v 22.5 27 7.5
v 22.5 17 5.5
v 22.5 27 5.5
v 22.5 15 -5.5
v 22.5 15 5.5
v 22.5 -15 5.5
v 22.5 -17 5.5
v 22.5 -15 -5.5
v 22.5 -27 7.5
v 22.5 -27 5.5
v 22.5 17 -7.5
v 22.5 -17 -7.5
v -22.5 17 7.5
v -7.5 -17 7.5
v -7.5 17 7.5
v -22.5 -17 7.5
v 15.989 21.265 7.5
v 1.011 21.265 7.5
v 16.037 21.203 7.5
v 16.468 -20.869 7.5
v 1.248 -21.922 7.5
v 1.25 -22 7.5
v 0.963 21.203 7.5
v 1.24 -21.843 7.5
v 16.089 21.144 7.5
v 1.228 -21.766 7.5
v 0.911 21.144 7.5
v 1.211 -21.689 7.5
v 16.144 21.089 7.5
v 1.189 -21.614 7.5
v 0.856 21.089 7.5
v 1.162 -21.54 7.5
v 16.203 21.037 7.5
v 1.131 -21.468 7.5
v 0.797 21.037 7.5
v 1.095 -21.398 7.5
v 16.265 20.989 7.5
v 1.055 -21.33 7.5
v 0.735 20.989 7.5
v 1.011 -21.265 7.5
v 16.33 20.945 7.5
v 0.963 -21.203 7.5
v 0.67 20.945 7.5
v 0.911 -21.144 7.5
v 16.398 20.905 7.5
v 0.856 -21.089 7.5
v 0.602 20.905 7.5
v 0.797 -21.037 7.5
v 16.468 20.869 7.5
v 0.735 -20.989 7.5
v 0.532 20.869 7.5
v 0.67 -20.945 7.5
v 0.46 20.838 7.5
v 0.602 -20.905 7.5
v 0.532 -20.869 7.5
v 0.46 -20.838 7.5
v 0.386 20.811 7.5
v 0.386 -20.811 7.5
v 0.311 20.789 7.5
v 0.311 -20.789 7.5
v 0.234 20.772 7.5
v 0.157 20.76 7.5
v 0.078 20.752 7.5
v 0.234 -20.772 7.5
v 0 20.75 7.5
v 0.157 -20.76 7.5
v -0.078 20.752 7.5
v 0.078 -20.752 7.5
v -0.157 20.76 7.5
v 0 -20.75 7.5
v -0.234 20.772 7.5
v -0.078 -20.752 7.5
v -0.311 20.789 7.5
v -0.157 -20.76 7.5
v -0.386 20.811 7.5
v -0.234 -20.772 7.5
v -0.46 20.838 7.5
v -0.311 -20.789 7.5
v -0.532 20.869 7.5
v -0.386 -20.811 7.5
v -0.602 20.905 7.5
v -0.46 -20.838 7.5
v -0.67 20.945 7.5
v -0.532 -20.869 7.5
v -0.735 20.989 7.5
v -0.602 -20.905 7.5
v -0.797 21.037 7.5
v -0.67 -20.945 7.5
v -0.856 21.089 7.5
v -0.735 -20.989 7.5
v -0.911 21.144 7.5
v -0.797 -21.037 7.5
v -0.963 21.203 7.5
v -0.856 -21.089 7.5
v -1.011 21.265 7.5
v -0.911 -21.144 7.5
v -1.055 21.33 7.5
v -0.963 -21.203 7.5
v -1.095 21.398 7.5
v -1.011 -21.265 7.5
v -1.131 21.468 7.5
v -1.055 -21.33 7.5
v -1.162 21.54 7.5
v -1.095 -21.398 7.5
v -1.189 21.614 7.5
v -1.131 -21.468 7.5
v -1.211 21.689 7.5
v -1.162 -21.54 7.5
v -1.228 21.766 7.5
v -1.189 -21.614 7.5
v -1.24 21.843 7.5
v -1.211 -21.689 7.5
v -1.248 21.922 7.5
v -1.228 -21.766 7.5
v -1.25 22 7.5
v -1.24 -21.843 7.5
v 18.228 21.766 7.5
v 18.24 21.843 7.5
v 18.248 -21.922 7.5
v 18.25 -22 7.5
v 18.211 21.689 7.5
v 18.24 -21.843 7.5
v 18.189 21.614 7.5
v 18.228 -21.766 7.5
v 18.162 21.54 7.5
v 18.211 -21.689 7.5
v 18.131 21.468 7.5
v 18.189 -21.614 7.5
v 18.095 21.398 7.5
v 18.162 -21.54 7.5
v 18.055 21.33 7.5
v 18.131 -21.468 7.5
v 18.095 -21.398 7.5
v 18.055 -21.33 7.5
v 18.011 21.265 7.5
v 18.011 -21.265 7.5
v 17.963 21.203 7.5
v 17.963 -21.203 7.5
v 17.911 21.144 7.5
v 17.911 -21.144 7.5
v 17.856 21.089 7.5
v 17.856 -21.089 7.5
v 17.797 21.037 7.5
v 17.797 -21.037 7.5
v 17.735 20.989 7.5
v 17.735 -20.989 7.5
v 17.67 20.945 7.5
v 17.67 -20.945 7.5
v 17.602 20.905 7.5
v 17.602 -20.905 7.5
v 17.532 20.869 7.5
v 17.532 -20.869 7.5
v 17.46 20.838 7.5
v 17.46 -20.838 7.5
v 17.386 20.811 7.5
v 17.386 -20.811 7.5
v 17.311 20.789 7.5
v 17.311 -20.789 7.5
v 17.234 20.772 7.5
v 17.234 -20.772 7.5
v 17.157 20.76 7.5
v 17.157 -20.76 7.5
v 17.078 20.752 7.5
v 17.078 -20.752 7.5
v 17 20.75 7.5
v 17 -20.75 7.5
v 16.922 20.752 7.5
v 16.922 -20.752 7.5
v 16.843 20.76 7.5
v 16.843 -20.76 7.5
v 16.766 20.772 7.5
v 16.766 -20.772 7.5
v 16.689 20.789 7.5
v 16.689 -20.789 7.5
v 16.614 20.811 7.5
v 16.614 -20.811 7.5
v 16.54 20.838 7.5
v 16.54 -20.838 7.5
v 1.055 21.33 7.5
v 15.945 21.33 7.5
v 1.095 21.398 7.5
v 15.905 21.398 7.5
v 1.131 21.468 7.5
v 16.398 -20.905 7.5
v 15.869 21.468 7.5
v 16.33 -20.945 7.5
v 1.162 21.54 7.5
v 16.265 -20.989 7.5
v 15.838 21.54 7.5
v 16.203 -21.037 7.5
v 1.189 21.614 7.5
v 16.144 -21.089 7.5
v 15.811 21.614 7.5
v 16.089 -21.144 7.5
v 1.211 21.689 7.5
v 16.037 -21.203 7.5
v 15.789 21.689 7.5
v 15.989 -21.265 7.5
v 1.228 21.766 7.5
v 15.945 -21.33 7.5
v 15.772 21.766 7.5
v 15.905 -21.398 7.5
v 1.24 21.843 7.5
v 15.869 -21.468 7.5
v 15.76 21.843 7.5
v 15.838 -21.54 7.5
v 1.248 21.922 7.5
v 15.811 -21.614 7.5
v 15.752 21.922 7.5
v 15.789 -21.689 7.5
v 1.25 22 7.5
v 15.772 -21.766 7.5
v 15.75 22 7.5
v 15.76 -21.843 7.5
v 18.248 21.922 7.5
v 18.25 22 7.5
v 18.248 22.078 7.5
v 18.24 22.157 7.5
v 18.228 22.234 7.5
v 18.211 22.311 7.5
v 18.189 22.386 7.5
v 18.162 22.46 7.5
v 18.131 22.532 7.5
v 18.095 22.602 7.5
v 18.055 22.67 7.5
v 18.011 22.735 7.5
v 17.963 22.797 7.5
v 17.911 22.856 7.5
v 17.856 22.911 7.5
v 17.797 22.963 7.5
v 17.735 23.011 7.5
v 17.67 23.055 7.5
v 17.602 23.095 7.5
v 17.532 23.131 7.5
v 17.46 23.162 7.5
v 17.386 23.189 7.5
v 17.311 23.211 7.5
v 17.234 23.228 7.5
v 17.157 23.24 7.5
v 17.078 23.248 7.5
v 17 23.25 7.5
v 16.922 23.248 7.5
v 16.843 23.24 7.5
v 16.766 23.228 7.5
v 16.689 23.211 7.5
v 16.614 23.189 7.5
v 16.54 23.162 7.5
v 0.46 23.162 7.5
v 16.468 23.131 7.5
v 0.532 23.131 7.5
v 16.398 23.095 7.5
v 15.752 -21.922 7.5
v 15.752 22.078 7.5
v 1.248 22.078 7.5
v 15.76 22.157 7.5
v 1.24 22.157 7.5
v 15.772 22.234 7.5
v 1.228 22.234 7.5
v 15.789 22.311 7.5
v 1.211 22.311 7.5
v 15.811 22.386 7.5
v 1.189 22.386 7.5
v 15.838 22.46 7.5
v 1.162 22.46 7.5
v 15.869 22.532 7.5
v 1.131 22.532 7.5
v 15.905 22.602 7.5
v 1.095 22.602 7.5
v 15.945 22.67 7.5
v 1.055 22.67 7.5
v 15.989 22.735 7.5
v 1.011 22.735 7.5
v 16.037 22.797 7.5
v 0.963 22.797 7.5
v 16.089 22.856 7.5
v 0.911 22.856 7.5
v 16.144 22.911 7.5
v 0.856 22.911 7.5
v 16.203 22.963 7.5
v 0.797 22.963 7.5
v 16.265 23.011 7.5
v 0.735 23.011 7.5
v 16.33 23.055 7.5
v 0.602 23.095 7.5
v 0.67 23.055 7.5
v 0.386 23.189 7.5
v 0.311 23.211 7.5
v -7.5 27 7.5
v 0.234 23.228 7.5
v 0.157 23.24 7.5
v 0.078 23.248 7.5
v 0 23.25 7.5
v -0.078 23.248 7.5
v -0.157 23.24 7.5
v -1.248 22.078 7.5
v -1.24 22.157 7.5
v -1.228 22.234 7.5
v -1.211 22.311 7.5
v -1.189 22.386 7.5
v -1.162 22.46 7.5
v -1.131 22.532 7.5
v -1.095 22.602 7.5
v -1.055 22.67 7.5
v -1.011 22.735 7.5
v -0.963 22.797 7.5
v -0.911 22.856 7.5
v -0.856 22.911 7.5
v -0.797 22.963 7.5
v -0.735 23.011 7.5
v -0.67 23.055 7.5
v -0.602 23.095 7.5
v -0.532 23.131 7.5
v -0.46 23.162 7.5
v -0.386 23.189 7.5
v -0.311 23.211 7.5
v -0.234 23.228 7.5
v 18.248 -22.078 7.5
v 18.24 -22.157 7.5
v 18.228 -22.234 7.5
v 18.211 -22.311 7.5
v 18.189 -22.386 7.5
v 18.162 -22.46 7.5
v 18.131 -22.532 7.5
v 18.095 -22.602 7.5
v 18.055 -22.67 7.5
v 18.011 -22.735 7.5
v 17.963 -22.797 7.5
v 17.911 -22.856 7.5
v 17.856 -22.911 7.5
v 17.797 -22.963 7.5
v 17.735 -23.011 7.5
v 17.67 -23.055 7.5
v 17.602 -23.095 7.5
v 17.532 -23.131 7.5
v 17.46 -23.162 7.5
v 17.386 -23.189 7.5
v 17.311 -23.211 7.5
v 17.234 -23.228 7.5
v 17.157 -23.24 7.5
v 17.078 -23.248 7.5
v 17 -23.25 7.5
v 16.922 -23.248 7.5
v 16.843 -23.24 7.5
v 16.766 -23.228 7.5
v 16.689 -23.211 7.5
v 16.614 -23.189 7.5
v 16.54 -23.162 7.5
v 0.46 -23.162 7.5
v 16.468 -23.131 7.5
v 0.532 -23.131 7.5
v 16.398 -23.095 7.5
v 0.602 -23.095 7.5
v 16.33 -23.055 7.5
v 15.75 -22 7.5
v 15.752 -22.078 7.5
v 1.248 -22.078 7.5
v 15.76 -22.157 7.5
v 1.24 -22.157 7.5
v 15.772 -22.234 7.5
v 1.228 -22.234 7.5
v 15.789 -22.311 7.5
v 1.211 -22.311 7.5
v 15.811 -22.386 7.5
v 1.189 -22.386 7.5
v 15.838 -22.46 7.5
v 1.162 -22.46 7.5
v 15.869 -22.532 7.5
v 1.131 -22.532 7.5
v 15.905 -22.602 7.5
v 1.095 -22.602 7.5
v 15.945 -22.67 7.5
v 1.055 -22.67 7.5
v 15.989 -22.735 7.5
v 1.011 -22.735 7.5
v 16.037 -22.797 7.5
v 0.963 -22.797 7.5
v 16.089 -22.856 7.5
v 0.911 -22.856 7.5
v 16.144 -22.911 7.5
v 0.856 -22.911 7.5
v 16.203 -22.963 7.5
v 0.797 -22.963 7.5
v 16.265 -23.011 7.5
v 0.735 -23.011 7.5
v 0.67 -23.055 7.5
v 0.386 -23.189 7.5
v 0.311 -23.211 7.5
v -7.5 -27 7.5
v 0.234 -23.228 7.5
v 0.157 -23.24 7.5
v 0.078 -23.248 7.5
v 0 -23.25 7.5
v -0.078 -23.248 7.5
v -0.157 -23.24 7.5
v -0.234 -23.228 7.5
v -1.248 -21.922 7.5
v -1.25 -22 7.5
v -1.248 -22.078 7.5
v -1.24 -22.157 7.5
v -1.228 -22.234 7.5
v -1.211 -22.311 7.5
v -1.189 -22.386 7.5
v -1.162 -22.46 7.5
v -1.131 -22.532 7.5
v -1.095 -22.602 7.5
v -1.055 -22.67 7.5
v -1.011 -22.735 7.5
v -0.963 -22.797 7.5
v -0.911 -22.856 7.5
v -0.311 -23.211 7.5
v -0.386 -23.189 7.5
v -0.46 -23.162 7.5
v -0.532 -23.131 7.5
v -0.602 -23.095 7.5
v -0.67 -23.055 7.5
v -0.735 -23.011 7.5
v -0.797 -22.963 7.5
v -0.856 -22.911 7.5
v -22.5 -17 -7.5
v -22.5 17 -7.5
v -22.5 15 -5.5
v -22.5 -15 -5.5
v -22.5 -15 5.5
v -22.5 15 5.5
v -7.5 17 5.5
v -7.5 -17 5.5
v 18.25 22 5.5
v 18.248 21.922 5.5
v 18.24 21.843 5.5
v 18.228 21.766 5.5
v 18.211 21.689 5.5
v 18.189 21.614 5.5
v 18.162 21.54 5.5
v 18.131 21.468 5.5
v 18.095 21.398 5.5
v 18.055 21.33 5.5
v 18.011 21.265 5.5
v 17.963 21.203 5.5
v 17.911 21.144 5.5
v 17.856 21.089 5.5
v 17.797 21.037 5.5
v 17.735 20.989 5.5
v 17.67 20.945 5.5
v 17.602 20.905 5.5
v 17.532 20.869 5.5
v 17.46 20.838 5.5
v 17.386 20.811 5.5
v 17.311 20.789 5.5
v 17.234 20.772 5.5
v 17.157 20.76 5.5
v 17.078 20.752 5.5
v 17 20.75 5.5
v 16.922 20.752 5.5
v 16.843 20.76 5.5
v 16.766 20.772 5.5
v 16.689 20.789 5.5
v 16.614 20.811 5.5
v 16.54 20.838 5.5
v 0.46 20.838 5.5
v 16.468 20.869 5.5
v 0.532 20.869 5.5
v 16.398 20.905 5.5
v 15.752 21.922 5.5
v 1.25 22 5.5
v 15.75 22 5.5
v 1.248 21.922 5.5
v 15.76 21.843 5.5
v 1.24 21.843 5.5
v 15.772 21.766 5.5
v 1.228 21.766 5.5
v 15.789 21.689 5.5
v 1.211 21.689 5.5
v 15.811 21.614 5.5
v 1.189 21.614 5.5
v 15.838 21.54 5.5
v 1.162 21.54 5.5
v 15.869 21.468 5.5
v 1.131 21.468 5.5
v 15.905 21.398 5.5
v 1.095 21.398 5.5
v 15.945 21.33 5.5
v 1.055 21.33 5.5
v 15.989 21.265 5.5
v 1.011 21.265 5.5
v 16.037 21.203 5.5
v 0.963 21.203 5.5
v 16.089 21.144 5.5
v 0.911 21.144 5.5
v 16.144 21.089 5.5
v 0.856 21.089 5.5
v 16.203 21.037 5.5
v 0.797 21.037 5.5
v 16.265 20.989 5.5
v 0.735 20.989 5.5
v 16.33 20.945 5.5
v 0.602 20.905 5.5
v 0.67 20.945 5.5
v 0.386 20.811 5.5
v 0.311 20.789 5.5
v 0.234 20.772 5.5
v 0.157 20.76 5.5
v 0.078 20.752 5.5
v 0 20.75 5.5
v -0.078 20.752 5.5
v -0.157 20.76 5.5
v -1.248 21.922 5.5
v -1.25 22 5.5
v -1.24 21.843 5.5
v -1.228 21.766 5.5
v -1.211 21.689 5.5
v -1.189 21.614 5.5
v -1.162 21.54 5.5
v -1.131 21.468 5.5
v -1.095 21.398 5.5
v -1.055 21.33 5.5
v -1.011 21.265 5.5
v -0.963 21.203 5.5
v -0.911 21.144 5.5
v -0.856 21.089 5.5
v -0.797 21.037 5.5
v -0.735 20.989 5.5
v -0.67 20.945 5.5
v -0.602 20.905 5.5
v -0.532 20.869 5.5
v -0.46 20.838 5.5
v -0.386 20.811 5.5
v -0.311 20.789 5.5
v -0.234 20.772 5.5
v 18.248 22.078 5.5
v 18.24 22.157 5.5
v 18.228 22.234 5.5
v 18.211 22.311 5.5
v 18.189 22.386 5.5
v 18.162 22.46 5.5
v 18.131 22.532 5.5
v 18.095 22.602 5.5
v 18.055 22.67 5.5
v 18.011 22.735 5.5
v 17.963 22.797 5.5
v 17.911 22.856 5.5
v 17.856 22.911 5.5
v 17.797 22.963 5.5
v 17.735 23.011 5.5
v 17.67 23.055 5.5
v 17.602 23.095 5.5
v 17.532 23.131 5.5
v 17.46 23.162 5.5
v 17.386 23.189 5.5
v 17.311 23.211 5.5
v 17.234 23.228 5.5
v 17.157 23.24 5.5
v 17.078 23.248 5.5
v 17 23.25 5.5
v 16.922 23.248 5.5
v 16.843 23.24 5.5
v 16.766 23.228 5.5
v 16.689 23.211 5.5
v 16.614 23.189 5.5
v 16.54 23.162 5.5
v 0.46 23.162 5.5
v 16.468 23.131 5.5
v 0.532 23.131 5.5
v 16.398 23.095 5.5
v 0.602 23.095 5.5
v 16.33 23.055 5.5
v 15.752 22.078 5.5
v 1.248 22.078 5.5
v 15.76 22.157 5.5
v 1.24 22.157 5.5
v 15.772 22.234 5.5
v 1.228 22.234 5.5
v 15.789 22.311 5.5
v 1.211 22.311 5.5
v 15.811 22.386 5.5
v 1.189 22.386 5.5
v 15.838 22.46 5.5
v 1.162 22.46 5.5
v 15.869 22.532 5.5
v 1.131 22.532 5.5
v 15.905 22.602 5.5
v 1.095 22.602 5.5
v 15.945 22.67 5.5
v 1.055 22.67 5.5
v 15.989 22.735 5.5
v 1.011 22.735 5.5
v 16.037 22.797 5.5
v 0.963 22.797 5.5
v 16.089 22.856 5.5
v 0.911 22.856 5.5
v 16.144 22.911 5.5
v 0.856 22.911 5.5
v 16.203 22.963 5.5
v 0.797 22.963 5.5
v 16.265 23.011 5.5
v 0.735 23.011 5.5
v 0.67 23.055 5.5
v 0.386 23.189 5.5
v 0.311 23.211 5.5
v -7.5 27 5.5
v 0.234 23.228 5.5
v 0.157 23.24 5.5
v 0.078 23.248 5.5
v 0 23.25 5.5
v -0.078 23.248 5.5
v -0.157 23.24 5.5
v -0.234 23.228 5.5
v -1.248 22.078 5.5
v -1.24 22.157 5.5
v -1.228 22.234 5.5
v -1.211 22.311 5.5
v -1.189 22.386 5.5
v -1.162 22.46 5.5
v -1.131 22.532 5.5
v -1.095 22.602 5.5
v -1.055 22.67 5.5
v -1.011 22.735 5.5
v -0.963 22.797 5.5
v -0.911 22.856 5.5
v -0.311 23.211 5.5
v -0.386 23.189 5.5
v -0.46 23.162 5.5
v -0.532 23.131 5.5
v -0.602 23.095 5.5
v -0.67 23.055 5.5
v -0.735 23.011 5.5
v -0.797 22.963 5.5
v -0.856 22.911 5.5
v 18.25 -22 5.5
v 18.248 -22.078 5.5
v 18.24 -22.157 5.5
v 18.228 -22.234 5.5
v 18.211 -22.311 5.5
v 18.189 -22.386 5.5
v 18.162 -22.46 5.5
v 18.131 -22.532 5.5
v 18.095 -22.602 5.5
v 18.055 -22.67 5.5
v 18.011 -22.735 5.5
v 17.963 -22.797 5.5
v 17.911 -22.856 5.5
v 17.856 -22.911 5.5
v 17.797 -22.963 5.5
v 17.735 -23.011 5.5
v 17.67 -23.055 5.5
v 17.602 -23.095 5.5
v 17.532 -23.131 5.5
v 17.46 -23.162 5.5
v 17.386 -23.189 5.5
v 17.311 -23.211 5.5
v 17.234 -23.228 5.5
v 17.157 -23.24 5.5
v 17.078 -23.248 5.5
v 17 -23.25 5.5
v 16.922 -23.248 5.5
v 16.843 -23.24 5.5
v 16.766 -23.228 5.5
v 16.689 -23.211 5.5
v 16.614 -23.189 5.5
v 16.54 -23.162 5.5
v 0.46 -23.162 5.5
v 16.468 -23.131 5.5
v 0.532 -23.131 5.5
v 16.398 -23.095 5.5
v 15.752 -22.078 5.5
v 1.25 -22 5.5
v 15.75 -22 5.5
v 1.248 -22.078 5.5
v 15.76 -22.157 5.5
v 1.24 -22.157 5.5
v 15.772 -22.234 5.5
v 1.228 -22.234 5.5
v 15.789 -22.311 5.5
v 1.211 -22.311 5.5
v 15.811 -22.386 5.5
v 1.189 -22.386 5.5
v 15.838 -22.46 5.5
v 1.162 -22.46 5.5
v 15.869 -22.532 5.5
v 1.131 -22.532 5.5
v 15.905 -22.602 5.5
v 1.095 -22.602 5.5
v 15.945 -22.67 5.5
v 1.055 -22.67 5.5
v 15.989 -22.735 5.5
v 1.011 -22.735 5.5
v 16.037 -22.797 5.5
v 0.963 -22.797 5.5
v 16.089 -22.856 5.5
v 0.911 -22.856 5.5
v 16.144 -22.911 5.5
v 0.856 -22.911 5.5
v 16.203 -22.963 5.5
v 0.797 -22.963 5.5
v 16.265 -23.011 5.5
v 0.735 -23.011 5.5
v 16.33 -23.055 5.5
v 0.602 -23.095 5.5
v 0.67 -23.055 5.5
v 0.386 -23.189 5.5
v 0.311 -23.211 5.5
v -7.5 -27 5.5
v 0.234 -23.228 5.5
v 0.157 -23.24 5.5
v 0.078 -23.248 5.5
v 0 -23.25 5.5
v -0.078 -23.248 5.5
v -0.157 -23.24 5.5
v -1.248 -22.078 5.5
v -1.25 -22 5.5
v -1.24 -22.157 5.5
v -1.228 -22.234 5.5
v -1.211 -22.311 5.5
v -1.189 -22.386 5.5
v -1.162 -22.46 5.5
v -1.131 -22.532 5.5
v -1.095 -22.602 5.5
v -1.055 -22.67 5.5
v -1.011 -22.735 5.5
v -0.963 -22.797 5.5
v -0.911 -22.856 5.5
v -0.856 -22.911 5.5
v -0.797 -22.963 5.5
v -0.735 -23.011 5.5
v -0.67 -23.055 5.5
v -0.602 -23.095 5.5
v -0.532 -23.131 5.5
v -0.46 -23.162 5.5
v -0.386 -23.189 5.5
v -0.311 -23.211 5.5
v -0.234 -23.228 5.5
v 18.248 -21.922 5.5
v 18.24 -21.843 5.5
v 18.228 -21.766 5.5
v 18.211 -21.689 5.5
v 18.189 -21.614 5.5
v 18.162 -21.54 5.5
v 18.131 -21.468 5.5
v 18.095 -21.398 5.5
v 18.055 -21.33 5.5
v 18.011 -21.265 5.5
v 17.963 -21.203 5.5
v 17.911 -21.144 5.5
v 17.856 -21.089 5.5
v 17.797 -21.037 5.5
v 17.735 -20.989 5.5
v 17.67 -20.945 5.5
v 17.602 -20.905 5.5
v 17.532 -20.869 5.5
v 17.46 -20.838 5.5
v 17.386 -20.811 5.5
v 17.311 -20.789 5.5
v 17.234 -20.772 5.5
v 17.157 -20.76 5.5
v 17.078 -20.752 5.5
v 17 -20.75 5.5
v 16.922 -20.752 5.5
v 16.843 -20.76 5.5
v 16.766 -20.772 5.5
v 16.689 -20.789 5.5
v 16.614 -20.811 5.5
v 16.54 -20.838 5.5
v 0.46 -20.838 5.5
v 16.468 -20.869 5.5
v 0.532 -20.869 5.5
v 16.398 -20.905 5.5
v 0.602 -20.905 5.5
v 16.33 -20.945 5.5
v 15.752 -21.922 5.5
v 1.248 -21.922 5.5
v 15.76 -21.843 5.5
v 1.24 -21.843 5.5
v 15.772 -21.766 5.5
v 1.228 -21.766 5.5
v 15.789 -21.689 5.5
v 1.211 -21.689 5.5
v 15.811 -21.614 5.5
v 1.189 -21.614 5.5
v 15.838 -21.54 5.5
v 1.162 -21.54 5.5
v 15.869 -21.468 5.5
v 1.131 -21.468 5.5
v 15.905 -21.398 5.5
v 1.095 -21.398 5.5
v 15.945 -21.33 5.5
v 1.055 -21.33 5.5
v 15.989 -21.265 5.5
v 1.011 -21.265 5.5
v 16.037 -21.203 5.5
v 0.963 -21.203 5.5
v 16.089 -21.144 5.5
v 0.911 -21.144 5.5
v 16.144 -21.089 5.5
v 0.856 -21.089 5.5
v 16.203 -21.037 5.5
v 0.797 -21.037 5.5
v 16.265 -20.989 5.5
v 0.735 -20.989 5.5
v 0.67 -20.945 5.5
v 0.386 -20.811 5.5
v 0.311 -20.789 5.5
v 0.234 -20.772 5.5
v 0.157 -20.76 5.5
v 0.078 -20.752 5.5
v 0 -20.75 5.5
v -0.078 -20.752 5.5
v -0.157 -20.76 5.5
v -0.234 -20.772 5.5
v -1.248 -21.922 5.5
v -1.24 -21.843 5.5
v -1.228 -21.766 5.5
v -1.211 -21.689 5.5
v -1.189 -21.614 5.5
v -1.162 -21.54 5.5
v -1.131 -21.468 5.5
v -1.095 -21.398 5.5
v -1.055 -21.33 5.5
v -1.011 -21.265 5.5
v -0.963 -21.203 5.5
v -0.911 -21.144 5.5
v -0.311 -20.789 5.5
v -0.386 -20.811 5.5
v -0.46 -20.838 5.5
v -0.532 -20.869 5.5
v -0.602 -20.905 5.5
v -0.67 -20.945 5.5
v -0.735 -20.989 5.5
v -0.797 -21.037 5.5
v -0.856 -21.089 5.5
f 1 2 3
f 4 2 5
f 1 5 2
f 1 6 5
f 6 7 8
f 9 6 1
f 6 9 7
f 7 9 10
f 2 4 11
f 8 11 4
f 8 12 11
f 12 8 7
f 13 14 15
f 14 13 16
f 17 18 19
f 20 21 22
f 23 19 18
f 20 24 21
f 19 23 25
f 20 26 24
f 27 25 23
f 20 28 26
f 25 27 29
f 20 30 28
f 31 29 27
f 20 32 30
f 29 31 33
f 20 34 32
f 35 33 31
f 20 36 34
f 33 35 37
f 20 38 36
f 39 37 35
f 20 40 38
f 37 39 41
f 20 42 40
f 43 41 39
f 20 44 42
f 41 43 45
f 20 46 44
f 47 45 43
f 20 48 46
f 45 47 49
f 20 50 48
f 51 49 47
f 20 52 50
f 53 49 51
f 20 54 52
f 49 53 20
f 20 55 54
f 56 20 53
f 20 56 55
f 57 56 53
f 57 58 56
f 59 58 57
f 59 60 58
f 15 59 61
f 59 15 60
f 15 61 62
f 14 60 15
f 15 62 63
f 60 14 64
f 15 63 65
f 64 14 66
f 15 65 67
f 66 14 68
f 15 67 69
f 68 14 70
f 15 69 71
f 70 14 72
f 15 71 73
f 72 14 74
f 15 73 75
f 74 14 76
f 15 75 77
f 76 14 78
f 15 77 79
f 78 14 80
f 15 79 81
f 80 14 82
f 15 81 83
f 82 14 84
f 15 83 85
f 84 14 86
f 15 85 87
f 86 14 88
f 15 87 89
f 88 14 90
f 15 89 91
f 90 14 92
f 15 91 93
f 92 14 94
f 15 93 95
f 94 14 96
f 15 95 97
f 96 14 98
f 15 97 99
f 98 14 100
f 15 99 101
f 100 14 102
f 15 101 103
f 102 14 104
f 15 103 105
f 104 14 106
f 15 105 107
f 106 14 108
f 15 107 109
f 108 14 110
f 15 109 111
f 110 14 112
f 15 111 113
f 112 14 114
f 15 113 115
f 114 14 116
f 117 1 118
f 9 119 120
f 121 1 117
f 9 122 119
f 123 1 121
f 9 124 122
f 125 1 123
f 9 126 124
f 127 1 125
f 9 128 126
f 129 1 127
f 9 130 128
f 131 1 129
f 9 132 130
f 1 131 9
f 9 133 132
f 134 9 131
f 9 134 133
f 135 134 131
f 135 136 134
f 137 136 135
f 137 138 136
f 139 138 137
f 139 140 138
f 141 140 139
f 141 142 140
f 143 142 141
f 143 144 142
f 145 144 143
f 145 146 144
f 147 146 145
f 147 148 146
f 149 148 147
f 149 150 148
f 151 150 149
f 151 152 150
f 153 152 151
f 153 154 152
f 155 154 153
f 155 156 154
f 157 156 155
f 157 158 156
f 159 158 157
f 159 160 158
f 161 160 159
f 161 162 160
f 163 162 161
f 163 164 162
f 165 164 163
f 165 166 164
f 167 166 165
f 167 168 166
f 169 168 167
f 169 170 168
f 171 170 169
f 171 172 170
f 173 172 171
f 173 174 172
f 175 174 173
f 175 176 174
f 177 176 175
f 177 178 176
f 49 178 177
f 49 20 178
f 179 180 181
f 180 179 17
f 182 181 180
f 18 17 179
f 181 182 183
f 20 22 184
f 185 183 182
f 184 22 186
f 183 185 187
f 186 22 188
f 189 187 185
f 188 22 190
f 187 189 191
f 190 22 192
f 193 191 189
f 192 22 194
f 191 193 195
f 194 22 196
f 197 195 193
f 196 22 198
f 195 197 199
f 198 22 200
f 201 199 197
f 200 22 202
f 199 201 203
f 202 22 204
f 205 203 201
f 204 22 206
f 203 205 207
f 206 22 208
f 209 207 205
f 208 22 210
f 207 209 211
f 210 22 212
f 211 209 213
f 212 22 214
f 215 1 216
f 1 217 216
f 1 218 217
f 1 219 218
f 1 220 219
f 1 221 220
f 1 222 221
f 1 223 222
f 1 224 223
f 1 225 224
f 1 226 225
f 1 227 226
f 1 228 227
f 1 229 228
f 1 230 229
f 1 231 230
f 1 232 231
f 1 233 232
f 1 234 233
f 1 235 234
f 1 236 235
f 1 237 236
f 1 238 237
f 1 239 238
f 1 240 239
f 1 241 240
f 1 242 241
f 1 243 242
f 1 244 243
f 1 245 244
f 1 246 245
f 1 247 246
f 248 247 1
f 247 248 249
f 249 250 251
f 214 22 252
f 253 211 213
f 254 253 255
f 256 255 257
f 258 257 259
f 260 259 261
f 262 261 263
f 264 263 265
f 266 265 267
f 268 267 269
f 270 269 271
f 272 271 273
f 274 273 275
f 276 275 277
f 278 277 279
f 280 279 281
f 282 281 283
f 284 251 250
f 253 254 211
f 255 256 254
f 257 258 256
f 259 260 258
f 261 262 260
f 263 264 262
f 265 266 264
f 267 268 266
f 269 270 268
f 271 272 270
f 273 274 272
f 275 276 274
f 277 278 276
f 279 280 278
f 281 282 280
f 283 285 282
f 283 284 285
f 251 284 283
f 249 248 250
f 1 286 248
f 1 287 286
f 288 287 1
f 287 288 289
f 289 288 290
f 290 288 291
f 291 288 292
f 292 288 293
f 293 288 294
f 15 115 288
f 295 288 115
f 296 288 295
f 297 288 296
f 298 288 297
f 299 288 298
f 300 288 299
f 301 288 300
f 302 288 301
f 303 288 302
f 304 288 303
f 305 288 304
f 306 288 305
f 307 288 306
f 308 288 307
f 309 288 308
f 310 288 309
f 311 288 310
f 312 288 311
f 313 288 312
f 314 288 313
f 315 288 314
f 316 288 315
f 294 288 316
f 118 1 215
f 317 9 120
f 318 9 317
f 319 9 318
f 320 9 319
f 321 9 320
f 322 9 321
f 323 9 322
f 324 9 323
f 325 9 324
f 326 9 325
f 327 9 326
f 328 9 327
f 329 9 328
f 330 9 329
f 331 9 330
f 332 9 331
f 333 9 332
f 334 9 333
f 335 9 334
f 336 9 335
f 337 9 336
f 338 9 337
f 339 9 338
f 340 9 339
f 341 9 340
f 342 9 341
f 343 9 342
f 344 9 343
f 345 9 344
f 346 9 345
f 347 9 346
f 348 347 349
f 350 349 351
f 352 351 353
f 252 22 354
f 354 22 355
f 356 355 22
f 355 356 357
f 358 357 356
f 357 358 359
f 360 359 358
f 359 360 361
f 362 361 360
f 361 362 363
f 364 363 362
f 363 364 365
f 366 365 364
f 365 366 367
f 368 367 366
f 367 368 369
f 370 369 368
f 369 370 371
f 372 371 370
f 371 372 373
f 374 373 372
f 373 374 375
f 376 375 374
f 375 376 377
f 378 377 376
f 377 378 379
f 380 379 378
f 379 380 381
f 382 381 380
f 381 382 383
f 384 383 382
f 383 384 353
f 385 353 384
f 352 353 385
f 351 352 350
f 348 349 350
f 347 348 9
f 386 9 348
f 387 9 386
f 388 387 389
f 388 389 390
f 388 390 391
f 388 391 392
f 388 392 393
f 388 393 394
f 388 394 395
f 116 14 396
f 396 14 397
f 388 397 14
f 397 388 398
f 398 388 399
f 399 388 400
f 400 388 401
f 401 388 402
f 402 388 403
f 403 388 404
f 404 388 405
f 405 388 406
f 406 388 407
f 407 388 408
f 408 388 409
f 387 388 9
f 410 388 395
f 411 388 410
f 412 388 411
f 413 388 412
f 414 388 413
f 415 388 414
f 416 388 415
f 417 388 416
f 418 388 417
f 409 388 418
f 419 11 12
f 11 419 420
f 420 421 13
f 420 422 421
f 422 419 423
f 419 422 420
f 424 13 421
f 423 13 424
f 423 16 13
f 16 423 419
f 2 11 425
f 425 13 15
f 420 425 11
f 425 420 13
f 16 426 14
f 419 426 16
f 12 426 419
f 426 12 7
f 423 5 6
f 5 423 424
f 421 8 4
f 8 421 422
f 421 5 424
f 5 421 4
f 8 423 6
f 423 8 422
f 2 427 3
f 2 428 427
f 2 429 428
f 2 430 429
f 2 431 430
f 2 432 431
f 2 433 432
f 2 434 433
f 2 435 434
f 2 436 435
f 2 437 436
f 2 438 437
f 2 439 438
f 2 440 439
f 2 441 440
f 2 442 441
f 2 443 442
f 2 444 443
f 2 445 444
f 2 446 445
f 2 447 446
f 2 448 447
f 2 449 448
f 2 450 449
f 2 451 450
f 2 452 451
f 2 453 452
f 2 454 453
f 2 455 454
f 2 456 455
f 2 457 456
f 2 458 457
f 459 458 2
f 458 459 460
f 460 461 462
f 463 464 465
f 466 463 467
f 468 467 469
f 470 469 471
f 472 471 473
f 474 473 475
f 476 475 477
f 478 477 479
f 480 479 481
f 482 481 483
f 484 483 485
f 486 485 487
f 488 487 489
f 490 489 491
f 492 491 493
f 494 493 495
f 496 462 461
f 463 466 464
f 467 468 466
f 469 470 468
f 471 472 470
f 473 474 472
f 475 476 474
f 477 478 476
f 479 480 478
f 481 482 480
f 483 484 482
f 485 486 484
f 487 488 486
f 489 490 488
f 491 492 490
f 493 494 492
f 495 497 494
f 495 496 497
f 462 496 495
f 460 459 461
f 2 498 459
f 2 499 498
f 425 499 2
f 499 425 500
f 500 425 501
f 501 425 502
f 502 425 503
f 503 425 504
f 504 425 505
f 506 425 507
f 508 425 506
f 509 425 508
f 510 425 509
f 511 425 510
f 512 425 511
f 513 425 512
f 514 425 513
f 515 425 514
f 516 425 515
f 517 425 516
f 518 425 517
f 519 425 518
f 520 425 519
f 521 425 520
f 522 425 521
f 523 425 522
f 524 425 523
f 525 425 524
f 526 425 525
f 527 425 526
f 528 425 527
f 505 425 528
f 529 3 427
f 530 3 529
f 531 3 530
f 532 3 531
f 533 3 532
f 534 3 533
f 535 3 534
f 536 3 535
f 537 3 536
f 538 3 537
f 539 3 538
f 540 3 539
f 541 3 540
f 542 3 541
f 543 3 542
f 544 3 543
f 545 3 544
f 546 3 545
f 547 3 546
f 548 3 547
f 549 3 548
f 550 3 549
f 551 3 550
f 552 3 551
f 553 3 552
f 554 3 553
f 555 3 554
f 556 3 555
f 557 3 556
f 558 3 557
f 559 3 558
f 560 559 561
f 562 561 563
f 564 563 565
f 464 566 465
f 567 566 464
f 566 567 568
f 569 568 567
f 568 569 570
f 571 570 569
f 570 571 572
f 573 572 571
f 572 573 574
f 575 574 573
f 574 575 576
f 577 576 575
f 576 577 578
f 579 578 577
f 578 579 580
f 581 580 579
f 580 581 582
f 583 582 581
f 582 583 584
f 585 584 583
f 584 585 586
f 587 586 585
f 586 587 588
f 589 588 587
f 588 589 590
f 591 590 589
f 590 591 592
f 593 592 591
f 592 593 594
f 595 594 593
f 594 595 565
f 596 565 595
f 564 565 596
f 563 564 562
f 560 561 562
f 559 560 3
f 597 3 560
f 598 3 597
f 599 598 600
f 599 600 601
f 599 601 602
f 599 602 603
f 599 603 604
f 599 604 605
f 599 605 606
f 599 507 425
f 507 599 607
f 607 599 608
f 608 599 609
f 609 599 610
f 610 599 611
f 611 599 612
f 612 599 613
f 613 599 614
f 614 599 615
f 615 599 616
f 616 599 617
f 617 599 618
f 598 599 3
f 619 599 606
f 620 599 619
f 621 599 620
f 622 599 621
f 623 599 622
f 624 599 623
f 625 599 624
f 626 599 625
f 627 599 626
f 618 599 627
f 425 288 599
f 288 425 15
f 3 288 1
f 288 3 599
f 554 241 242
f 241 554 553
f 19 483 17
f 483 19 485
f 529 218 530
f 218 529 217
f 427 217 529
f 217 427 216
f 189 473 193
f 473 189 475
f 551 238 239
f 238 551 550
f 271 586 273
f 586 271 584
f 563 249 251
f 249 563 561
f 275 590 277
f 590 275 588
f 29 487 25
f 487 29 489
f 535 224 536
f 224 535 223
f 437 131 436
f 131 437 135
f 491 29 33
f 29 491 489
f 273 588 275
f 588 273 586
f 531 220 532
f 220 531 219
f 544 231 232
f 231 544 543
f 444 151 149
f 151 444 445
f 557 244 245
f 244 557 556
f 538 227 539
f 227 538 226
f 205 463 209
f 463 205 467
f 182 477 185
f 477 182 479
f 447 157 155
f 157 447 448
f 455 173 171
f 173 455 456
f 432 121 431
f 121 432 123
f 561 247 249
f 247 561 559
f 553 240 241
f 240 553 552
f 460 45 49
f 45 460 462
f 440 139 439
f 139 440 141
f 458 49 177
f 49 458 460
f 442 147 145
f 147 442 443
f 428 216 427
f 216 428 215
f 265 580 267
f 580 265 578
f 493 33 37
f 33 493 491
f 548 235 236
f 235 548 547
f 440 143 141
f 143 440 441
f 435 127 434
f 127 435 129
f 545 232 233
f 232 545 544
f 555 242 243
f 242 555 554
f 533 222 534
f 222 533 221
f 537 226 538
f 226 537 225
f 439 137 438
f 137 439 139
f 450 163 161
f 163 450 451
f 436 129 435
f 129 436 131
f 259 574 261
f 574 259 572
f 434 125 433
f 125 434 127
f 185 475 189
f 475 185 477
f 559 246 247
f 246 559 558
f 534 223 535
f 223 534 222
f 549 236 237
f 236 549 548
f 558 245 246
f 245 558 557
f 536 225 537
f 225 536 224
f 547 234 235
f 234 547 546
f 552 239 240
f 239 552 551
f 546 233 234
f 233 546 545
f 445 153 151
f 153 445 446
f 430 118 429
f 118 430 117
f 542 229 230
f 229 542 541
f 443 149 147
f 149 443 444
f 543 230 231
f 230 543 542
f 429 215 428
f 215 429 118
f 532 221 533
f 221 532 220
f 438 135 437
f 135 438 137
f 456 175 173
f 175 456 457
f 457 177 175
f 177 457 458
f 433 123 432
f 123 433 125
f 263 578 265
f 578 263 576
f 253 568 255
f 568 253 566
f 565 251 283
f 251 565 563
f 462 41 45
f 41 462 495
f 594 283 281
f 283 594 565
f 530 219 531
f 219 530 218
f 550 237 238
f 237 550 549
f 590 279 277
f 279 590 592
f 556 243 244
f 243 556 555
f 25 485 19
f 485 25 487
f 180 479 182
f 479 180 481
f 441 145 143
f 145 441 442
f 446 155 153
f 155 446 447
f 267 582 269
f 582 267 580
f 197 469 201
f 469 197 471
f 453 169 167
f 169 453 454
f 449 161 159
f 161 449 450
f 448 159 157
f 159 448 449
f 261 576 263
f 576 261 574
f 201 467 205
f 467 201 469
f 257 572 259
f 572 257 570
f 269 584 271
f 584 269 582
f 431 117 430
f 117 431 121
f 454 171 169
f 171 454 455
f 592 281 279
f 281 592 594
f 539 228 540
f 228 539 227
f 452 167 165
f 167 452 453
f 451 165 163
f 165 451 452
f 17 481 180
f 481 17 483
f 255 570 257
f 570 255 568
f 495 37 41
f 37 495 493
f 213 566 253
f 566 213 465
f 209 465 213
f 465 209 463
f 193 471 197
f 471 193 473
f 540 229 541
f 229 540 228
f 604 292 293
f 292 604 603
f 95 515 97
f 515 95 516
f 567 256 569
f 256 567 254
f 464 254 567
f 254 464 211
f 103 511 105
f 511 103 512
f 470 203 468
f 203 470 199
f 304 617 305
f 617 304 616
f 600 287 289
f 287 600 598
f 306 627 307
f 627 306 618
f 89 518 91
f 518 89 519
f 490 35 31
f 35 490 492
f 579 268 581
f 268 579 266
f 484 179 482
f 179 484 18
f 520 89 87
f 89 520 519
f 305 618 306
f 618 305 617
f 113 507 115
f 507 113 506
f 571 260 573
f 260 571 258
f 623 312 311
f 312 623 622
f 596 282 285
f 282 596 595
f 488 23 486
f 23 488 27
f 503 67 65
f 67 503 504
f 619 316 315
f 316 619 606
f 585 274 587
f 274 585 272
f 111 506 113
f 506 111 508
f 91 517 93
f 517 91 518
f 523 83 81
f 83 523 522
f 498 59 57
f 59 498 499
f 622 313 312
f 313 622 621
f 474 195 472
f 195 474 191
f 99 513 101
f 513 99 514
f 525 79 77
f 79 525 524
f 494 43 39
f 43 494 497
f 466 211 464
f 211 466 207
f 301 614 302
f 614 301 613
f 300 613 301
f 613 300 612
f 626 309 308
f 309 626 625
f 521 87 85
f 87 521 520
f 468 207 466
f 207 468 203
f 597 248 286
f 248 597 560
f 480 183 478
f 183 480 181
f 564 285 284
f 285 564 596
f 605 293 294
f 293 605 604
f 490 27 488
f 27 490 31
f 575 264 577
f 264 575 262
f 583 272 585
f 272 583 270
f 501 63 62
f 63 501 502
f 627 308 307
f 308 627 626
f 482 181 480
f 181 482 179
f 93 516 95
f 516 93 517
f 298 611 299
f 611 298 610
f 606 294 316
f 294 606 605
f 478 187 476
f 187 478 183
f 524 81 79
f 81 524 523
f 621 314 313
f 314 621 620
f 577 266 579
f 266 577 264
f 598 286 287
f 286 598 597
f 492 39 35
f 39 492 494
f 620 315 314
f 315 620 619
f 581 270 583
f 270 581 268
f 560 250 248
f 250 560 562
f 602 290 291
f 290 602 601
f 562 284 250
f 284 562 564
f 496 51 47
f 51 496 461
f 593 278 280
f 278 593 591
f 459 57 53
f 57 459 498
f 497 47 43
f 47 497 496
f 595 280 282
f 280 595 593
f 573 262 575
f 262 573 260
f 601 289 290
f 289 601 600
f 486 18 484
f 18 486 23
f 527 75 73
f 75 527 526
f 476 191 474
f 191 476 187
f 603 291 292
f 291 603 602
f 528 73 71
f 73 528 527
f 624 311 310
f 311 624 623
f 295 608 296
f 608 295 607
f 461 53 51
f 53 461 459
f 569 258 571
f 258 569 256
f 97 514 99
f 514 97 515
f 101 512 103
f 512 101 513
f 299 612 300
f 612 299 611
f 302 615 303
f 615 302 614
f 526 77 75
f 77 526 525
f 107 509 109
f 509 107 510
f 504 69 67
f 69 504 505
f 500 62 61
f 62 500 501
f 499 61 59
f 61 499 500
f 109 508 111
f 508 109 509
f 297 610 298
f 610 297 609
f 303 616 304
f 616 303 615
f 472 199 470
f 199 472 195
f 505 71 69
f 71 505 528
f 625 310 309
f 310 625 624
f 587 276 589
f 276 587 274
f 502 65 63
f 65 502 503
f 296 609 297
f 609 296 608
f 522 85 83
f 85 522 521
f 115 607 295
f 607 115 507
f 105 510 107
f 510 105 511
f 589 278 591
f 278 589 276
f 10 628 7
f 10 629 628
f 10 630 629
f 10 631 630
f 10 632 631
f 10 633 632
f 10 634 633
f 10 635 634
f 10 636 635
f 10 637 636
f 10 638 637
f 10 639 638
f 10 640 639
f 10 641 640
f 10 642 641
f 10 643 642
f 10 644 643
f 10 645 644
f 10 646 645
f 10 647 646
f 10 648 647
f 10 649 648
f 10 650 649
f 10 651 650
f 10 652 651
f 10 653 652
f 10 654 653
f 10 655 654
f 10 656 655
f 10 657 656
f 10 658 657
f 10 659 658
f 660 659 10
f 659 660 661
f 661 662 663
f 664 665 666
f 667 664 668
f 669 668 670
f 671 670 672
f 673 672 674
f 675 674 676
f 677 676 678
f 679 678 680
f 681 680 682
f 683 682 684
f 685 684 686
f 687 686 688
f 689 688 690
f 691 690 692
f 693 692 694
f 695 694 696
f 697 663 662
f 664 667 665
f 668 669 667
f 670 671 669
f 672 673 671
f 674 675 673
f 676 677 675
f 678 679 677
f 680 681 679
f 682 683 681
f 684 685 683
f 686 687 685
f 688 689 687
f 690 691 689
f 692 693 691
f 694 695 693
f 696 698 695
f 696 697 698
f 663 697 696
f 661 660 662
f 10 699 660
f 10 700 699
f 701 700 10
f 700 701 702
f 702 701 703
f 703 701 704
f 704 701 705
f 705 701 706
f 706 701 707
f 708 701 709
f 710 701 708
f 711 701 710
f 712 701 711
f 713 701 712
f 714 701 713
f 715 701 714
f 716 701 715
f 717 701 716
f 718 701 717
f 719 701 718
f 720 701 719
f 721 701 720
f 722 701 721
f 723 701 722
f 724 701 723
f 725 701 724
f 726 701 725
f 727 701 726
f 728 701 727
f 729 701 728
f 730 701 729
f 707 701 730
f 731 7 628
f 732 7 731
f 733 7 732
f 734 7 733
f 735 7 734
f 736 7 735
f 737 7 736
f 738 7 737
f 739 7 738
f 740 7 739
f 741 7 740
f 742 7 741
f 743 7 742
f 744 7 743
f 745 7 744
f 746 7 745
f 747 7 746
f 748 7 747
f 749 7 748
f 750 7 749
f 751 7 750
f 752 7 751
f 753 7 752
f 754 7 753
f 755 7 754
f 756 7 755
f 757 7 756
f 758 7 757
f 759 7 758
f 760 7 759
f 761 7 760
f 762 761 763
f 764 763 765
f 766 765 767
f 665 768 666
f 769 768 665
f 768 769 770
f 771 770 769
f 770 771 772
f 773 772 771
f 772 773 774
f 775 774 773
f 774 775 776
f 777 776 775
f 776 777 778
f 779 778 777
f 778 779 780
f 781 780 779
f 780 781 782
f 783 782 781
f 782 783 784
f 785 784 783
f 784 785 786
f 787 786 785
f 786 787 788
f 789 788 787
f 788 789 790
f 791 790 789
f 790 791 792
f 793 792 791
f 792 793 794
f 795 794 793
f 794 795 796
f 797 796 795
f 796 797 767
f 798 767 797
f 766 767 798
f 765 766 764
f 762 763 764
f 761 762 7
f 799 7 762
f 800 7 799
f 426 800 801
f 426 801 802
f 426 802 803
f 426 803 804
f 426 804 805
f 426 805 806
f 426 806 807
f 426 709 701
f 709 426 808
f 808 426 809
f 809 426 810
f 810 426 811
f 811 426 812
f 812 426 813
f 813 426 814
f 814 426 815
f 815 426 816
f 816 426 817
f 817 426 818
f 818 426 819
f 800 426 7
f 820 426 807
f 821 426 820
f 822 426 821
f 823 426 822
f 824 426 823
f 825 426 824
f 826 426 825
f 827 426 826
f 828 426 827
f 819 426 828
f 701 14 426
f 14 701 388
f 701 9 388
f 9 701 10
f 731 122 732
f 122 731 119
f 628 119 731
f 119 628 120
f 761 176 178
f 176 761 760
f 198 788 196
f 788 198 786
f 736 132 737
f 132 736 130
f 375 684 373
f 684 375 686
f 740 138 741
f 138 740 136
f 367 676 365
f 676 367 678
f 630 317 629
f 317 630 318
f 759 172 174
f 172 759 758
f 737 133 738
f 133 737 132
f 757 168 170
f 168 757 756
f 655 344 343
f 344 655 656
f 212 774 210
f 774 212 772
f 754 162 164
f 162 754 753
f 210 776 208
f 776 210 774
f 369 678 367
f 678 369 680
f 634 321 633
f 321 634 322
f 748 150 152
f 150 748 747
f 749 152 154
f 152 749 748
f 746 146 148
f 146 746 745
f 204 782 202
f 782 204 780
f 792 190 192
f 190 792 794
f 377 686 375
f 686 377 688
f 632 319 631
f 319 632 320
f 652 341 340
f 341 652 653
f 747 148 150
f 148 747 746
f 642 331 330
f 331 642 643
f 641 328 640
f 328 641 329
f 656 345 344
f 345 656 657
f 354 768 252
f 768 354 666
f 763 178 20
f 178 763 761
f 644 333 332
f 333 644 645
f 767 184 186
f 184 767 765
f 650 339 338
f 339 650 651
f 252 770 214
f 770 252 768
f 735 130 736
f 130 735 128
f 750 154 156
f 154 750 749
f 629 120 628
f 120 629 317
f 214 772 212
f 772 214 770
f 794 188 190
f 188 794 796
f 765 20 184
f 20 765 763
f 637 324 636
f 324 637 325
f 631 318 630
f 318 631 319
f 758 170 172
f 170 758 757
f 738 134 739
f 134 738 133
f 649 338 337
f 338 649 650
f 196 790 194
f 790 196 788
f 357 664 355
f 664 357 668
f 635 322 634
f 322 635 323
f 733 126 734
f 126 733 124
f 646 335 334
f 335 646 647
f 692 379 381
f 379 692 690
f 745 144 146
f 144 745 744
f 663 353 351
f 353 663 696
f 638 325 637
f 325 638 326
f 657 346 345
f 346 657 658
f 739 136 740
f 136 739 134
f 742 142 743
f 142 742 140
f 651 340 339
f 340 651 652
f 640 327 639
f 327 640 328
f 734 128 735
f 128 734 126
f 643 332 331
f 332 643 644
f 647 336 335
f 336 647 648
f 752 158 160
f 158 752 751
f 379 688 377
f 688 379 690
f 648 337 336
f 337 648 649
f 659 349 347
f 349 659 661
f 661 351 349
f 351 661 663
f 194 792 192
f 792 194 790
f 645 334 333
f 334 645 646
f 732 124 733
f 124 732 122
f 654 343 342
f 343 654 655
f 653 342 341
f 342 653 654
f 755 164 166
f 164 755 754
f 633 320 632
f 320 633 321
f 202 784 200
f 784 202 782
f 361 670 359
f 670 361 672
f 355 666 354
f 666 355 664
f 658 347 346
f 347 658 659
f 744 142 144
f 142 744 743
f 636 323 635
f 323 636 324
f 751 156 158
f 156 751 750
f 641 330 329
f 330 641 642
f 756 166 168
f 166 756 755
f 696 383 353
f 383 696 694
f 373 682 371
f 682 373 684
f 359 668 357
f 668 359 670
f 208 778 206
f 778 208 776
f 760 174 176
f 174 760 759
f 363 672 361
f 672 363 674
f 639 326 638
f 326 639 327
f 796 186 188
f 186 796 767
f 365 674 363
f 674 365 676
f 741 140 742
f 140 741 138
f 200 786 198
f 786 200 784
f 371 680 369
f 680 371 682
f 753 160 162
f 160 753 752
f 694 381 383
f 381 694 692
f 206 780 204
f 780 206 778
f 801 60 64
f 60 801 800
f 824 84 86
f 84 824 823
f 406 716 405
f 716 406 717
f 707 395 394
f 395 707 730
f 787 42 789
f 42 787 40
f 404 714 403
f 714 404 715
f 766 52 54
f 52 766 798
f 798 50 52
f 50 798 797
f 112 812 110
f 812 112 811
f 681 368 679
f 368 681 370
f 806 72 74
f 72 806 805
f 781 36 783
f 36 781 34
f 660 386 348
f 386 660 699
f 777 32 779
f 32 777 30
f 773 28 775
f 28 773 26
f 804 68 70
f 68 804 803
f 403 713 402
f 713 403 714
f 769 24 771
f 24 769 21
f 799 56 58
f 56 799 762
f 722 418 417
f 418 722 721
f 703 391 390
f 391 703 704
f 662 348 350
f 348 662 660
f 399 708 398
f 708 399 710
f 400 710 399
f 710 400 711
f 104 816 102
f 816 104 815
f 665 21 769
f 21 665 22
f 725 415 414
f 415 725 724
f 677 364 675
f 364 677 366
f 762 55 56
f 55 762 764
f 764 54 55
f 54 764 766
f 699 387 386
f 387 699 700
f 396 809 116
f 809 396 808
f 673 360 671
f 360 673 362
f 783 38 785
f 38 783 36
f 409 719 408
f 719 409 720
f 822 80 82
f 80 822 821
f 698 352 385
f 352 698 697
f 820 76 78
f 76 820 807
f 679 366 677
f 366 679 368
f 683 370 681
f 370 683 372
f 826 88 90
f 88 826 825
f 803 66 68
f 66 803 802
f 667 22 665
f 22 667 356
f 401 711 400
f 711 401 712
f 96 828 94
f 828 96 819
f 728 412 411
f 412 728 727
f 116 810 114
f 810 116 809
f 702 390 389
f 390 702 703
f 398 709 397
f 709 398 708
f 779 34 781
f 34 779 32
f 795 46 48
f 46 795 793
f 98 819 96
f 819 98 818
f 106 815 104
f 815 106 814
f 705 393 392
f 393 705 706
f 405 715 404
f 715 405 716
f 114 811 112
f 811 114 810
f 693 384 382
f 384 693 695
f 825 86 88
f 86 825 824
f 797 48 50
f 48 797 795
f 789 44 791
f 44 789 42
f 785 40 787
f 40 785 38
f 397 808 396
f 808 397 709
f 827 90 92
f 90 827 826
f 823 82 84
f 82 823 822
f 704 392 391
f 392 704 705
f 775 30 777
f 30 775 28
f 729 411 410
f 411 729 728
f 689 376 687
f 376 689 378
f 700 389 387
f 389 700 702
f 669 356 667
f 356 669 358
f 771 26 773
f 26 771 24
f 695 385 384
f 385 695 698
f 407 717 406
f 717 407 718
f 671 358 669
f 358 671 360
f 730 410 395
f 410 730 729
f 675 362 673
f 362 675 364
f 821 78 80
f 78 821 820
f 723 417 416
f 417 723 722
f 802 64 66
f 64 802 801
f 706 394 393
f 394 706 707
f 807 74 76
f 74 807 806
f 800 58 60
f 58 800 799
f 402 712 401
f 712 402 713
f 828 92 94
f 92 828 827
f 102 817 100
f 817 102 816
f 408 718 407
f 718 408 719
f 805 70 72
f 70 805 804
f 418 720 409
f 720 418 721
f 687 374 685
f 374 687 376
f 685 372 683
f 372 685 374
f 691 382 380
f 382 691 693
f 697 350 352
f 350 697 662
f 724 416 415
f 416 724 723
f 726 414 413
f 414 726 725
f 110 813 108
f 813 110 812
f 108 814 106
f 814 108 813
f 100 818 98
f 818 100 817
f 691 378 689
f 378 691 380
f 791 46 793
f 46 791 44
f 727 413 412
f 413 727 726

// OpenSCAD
$fn=100;
//difference(){


difference(){
cube(center=true,[45,34,15]);
cube(center=true,[70,30,11]);
}
difference(){

translate([-7.5,17,5.5])
cube([30,10,2]);


translate([17,22,4])
cylinder(r=1.25,h=5);
	
translate([0,22,4])
cylinder(r=1.25,h=5);
}



difference(){
	
translate([-7.5,-27,5.5])
cube([30,10,2]);
//difference(){
//rotate([0,0,-30])
//translate([-9,-20.7,5.5])
//cube([50,19,2]);

//rotate([0,0,12])
//translate([22.5,-40,5])
//cube([25,80,4]);
//}

translate([17,-22,4])
cylinder(r=1.25,h=5);
	
translate([0,-22,4])
cylinder(r=1.25,h=5);
}
